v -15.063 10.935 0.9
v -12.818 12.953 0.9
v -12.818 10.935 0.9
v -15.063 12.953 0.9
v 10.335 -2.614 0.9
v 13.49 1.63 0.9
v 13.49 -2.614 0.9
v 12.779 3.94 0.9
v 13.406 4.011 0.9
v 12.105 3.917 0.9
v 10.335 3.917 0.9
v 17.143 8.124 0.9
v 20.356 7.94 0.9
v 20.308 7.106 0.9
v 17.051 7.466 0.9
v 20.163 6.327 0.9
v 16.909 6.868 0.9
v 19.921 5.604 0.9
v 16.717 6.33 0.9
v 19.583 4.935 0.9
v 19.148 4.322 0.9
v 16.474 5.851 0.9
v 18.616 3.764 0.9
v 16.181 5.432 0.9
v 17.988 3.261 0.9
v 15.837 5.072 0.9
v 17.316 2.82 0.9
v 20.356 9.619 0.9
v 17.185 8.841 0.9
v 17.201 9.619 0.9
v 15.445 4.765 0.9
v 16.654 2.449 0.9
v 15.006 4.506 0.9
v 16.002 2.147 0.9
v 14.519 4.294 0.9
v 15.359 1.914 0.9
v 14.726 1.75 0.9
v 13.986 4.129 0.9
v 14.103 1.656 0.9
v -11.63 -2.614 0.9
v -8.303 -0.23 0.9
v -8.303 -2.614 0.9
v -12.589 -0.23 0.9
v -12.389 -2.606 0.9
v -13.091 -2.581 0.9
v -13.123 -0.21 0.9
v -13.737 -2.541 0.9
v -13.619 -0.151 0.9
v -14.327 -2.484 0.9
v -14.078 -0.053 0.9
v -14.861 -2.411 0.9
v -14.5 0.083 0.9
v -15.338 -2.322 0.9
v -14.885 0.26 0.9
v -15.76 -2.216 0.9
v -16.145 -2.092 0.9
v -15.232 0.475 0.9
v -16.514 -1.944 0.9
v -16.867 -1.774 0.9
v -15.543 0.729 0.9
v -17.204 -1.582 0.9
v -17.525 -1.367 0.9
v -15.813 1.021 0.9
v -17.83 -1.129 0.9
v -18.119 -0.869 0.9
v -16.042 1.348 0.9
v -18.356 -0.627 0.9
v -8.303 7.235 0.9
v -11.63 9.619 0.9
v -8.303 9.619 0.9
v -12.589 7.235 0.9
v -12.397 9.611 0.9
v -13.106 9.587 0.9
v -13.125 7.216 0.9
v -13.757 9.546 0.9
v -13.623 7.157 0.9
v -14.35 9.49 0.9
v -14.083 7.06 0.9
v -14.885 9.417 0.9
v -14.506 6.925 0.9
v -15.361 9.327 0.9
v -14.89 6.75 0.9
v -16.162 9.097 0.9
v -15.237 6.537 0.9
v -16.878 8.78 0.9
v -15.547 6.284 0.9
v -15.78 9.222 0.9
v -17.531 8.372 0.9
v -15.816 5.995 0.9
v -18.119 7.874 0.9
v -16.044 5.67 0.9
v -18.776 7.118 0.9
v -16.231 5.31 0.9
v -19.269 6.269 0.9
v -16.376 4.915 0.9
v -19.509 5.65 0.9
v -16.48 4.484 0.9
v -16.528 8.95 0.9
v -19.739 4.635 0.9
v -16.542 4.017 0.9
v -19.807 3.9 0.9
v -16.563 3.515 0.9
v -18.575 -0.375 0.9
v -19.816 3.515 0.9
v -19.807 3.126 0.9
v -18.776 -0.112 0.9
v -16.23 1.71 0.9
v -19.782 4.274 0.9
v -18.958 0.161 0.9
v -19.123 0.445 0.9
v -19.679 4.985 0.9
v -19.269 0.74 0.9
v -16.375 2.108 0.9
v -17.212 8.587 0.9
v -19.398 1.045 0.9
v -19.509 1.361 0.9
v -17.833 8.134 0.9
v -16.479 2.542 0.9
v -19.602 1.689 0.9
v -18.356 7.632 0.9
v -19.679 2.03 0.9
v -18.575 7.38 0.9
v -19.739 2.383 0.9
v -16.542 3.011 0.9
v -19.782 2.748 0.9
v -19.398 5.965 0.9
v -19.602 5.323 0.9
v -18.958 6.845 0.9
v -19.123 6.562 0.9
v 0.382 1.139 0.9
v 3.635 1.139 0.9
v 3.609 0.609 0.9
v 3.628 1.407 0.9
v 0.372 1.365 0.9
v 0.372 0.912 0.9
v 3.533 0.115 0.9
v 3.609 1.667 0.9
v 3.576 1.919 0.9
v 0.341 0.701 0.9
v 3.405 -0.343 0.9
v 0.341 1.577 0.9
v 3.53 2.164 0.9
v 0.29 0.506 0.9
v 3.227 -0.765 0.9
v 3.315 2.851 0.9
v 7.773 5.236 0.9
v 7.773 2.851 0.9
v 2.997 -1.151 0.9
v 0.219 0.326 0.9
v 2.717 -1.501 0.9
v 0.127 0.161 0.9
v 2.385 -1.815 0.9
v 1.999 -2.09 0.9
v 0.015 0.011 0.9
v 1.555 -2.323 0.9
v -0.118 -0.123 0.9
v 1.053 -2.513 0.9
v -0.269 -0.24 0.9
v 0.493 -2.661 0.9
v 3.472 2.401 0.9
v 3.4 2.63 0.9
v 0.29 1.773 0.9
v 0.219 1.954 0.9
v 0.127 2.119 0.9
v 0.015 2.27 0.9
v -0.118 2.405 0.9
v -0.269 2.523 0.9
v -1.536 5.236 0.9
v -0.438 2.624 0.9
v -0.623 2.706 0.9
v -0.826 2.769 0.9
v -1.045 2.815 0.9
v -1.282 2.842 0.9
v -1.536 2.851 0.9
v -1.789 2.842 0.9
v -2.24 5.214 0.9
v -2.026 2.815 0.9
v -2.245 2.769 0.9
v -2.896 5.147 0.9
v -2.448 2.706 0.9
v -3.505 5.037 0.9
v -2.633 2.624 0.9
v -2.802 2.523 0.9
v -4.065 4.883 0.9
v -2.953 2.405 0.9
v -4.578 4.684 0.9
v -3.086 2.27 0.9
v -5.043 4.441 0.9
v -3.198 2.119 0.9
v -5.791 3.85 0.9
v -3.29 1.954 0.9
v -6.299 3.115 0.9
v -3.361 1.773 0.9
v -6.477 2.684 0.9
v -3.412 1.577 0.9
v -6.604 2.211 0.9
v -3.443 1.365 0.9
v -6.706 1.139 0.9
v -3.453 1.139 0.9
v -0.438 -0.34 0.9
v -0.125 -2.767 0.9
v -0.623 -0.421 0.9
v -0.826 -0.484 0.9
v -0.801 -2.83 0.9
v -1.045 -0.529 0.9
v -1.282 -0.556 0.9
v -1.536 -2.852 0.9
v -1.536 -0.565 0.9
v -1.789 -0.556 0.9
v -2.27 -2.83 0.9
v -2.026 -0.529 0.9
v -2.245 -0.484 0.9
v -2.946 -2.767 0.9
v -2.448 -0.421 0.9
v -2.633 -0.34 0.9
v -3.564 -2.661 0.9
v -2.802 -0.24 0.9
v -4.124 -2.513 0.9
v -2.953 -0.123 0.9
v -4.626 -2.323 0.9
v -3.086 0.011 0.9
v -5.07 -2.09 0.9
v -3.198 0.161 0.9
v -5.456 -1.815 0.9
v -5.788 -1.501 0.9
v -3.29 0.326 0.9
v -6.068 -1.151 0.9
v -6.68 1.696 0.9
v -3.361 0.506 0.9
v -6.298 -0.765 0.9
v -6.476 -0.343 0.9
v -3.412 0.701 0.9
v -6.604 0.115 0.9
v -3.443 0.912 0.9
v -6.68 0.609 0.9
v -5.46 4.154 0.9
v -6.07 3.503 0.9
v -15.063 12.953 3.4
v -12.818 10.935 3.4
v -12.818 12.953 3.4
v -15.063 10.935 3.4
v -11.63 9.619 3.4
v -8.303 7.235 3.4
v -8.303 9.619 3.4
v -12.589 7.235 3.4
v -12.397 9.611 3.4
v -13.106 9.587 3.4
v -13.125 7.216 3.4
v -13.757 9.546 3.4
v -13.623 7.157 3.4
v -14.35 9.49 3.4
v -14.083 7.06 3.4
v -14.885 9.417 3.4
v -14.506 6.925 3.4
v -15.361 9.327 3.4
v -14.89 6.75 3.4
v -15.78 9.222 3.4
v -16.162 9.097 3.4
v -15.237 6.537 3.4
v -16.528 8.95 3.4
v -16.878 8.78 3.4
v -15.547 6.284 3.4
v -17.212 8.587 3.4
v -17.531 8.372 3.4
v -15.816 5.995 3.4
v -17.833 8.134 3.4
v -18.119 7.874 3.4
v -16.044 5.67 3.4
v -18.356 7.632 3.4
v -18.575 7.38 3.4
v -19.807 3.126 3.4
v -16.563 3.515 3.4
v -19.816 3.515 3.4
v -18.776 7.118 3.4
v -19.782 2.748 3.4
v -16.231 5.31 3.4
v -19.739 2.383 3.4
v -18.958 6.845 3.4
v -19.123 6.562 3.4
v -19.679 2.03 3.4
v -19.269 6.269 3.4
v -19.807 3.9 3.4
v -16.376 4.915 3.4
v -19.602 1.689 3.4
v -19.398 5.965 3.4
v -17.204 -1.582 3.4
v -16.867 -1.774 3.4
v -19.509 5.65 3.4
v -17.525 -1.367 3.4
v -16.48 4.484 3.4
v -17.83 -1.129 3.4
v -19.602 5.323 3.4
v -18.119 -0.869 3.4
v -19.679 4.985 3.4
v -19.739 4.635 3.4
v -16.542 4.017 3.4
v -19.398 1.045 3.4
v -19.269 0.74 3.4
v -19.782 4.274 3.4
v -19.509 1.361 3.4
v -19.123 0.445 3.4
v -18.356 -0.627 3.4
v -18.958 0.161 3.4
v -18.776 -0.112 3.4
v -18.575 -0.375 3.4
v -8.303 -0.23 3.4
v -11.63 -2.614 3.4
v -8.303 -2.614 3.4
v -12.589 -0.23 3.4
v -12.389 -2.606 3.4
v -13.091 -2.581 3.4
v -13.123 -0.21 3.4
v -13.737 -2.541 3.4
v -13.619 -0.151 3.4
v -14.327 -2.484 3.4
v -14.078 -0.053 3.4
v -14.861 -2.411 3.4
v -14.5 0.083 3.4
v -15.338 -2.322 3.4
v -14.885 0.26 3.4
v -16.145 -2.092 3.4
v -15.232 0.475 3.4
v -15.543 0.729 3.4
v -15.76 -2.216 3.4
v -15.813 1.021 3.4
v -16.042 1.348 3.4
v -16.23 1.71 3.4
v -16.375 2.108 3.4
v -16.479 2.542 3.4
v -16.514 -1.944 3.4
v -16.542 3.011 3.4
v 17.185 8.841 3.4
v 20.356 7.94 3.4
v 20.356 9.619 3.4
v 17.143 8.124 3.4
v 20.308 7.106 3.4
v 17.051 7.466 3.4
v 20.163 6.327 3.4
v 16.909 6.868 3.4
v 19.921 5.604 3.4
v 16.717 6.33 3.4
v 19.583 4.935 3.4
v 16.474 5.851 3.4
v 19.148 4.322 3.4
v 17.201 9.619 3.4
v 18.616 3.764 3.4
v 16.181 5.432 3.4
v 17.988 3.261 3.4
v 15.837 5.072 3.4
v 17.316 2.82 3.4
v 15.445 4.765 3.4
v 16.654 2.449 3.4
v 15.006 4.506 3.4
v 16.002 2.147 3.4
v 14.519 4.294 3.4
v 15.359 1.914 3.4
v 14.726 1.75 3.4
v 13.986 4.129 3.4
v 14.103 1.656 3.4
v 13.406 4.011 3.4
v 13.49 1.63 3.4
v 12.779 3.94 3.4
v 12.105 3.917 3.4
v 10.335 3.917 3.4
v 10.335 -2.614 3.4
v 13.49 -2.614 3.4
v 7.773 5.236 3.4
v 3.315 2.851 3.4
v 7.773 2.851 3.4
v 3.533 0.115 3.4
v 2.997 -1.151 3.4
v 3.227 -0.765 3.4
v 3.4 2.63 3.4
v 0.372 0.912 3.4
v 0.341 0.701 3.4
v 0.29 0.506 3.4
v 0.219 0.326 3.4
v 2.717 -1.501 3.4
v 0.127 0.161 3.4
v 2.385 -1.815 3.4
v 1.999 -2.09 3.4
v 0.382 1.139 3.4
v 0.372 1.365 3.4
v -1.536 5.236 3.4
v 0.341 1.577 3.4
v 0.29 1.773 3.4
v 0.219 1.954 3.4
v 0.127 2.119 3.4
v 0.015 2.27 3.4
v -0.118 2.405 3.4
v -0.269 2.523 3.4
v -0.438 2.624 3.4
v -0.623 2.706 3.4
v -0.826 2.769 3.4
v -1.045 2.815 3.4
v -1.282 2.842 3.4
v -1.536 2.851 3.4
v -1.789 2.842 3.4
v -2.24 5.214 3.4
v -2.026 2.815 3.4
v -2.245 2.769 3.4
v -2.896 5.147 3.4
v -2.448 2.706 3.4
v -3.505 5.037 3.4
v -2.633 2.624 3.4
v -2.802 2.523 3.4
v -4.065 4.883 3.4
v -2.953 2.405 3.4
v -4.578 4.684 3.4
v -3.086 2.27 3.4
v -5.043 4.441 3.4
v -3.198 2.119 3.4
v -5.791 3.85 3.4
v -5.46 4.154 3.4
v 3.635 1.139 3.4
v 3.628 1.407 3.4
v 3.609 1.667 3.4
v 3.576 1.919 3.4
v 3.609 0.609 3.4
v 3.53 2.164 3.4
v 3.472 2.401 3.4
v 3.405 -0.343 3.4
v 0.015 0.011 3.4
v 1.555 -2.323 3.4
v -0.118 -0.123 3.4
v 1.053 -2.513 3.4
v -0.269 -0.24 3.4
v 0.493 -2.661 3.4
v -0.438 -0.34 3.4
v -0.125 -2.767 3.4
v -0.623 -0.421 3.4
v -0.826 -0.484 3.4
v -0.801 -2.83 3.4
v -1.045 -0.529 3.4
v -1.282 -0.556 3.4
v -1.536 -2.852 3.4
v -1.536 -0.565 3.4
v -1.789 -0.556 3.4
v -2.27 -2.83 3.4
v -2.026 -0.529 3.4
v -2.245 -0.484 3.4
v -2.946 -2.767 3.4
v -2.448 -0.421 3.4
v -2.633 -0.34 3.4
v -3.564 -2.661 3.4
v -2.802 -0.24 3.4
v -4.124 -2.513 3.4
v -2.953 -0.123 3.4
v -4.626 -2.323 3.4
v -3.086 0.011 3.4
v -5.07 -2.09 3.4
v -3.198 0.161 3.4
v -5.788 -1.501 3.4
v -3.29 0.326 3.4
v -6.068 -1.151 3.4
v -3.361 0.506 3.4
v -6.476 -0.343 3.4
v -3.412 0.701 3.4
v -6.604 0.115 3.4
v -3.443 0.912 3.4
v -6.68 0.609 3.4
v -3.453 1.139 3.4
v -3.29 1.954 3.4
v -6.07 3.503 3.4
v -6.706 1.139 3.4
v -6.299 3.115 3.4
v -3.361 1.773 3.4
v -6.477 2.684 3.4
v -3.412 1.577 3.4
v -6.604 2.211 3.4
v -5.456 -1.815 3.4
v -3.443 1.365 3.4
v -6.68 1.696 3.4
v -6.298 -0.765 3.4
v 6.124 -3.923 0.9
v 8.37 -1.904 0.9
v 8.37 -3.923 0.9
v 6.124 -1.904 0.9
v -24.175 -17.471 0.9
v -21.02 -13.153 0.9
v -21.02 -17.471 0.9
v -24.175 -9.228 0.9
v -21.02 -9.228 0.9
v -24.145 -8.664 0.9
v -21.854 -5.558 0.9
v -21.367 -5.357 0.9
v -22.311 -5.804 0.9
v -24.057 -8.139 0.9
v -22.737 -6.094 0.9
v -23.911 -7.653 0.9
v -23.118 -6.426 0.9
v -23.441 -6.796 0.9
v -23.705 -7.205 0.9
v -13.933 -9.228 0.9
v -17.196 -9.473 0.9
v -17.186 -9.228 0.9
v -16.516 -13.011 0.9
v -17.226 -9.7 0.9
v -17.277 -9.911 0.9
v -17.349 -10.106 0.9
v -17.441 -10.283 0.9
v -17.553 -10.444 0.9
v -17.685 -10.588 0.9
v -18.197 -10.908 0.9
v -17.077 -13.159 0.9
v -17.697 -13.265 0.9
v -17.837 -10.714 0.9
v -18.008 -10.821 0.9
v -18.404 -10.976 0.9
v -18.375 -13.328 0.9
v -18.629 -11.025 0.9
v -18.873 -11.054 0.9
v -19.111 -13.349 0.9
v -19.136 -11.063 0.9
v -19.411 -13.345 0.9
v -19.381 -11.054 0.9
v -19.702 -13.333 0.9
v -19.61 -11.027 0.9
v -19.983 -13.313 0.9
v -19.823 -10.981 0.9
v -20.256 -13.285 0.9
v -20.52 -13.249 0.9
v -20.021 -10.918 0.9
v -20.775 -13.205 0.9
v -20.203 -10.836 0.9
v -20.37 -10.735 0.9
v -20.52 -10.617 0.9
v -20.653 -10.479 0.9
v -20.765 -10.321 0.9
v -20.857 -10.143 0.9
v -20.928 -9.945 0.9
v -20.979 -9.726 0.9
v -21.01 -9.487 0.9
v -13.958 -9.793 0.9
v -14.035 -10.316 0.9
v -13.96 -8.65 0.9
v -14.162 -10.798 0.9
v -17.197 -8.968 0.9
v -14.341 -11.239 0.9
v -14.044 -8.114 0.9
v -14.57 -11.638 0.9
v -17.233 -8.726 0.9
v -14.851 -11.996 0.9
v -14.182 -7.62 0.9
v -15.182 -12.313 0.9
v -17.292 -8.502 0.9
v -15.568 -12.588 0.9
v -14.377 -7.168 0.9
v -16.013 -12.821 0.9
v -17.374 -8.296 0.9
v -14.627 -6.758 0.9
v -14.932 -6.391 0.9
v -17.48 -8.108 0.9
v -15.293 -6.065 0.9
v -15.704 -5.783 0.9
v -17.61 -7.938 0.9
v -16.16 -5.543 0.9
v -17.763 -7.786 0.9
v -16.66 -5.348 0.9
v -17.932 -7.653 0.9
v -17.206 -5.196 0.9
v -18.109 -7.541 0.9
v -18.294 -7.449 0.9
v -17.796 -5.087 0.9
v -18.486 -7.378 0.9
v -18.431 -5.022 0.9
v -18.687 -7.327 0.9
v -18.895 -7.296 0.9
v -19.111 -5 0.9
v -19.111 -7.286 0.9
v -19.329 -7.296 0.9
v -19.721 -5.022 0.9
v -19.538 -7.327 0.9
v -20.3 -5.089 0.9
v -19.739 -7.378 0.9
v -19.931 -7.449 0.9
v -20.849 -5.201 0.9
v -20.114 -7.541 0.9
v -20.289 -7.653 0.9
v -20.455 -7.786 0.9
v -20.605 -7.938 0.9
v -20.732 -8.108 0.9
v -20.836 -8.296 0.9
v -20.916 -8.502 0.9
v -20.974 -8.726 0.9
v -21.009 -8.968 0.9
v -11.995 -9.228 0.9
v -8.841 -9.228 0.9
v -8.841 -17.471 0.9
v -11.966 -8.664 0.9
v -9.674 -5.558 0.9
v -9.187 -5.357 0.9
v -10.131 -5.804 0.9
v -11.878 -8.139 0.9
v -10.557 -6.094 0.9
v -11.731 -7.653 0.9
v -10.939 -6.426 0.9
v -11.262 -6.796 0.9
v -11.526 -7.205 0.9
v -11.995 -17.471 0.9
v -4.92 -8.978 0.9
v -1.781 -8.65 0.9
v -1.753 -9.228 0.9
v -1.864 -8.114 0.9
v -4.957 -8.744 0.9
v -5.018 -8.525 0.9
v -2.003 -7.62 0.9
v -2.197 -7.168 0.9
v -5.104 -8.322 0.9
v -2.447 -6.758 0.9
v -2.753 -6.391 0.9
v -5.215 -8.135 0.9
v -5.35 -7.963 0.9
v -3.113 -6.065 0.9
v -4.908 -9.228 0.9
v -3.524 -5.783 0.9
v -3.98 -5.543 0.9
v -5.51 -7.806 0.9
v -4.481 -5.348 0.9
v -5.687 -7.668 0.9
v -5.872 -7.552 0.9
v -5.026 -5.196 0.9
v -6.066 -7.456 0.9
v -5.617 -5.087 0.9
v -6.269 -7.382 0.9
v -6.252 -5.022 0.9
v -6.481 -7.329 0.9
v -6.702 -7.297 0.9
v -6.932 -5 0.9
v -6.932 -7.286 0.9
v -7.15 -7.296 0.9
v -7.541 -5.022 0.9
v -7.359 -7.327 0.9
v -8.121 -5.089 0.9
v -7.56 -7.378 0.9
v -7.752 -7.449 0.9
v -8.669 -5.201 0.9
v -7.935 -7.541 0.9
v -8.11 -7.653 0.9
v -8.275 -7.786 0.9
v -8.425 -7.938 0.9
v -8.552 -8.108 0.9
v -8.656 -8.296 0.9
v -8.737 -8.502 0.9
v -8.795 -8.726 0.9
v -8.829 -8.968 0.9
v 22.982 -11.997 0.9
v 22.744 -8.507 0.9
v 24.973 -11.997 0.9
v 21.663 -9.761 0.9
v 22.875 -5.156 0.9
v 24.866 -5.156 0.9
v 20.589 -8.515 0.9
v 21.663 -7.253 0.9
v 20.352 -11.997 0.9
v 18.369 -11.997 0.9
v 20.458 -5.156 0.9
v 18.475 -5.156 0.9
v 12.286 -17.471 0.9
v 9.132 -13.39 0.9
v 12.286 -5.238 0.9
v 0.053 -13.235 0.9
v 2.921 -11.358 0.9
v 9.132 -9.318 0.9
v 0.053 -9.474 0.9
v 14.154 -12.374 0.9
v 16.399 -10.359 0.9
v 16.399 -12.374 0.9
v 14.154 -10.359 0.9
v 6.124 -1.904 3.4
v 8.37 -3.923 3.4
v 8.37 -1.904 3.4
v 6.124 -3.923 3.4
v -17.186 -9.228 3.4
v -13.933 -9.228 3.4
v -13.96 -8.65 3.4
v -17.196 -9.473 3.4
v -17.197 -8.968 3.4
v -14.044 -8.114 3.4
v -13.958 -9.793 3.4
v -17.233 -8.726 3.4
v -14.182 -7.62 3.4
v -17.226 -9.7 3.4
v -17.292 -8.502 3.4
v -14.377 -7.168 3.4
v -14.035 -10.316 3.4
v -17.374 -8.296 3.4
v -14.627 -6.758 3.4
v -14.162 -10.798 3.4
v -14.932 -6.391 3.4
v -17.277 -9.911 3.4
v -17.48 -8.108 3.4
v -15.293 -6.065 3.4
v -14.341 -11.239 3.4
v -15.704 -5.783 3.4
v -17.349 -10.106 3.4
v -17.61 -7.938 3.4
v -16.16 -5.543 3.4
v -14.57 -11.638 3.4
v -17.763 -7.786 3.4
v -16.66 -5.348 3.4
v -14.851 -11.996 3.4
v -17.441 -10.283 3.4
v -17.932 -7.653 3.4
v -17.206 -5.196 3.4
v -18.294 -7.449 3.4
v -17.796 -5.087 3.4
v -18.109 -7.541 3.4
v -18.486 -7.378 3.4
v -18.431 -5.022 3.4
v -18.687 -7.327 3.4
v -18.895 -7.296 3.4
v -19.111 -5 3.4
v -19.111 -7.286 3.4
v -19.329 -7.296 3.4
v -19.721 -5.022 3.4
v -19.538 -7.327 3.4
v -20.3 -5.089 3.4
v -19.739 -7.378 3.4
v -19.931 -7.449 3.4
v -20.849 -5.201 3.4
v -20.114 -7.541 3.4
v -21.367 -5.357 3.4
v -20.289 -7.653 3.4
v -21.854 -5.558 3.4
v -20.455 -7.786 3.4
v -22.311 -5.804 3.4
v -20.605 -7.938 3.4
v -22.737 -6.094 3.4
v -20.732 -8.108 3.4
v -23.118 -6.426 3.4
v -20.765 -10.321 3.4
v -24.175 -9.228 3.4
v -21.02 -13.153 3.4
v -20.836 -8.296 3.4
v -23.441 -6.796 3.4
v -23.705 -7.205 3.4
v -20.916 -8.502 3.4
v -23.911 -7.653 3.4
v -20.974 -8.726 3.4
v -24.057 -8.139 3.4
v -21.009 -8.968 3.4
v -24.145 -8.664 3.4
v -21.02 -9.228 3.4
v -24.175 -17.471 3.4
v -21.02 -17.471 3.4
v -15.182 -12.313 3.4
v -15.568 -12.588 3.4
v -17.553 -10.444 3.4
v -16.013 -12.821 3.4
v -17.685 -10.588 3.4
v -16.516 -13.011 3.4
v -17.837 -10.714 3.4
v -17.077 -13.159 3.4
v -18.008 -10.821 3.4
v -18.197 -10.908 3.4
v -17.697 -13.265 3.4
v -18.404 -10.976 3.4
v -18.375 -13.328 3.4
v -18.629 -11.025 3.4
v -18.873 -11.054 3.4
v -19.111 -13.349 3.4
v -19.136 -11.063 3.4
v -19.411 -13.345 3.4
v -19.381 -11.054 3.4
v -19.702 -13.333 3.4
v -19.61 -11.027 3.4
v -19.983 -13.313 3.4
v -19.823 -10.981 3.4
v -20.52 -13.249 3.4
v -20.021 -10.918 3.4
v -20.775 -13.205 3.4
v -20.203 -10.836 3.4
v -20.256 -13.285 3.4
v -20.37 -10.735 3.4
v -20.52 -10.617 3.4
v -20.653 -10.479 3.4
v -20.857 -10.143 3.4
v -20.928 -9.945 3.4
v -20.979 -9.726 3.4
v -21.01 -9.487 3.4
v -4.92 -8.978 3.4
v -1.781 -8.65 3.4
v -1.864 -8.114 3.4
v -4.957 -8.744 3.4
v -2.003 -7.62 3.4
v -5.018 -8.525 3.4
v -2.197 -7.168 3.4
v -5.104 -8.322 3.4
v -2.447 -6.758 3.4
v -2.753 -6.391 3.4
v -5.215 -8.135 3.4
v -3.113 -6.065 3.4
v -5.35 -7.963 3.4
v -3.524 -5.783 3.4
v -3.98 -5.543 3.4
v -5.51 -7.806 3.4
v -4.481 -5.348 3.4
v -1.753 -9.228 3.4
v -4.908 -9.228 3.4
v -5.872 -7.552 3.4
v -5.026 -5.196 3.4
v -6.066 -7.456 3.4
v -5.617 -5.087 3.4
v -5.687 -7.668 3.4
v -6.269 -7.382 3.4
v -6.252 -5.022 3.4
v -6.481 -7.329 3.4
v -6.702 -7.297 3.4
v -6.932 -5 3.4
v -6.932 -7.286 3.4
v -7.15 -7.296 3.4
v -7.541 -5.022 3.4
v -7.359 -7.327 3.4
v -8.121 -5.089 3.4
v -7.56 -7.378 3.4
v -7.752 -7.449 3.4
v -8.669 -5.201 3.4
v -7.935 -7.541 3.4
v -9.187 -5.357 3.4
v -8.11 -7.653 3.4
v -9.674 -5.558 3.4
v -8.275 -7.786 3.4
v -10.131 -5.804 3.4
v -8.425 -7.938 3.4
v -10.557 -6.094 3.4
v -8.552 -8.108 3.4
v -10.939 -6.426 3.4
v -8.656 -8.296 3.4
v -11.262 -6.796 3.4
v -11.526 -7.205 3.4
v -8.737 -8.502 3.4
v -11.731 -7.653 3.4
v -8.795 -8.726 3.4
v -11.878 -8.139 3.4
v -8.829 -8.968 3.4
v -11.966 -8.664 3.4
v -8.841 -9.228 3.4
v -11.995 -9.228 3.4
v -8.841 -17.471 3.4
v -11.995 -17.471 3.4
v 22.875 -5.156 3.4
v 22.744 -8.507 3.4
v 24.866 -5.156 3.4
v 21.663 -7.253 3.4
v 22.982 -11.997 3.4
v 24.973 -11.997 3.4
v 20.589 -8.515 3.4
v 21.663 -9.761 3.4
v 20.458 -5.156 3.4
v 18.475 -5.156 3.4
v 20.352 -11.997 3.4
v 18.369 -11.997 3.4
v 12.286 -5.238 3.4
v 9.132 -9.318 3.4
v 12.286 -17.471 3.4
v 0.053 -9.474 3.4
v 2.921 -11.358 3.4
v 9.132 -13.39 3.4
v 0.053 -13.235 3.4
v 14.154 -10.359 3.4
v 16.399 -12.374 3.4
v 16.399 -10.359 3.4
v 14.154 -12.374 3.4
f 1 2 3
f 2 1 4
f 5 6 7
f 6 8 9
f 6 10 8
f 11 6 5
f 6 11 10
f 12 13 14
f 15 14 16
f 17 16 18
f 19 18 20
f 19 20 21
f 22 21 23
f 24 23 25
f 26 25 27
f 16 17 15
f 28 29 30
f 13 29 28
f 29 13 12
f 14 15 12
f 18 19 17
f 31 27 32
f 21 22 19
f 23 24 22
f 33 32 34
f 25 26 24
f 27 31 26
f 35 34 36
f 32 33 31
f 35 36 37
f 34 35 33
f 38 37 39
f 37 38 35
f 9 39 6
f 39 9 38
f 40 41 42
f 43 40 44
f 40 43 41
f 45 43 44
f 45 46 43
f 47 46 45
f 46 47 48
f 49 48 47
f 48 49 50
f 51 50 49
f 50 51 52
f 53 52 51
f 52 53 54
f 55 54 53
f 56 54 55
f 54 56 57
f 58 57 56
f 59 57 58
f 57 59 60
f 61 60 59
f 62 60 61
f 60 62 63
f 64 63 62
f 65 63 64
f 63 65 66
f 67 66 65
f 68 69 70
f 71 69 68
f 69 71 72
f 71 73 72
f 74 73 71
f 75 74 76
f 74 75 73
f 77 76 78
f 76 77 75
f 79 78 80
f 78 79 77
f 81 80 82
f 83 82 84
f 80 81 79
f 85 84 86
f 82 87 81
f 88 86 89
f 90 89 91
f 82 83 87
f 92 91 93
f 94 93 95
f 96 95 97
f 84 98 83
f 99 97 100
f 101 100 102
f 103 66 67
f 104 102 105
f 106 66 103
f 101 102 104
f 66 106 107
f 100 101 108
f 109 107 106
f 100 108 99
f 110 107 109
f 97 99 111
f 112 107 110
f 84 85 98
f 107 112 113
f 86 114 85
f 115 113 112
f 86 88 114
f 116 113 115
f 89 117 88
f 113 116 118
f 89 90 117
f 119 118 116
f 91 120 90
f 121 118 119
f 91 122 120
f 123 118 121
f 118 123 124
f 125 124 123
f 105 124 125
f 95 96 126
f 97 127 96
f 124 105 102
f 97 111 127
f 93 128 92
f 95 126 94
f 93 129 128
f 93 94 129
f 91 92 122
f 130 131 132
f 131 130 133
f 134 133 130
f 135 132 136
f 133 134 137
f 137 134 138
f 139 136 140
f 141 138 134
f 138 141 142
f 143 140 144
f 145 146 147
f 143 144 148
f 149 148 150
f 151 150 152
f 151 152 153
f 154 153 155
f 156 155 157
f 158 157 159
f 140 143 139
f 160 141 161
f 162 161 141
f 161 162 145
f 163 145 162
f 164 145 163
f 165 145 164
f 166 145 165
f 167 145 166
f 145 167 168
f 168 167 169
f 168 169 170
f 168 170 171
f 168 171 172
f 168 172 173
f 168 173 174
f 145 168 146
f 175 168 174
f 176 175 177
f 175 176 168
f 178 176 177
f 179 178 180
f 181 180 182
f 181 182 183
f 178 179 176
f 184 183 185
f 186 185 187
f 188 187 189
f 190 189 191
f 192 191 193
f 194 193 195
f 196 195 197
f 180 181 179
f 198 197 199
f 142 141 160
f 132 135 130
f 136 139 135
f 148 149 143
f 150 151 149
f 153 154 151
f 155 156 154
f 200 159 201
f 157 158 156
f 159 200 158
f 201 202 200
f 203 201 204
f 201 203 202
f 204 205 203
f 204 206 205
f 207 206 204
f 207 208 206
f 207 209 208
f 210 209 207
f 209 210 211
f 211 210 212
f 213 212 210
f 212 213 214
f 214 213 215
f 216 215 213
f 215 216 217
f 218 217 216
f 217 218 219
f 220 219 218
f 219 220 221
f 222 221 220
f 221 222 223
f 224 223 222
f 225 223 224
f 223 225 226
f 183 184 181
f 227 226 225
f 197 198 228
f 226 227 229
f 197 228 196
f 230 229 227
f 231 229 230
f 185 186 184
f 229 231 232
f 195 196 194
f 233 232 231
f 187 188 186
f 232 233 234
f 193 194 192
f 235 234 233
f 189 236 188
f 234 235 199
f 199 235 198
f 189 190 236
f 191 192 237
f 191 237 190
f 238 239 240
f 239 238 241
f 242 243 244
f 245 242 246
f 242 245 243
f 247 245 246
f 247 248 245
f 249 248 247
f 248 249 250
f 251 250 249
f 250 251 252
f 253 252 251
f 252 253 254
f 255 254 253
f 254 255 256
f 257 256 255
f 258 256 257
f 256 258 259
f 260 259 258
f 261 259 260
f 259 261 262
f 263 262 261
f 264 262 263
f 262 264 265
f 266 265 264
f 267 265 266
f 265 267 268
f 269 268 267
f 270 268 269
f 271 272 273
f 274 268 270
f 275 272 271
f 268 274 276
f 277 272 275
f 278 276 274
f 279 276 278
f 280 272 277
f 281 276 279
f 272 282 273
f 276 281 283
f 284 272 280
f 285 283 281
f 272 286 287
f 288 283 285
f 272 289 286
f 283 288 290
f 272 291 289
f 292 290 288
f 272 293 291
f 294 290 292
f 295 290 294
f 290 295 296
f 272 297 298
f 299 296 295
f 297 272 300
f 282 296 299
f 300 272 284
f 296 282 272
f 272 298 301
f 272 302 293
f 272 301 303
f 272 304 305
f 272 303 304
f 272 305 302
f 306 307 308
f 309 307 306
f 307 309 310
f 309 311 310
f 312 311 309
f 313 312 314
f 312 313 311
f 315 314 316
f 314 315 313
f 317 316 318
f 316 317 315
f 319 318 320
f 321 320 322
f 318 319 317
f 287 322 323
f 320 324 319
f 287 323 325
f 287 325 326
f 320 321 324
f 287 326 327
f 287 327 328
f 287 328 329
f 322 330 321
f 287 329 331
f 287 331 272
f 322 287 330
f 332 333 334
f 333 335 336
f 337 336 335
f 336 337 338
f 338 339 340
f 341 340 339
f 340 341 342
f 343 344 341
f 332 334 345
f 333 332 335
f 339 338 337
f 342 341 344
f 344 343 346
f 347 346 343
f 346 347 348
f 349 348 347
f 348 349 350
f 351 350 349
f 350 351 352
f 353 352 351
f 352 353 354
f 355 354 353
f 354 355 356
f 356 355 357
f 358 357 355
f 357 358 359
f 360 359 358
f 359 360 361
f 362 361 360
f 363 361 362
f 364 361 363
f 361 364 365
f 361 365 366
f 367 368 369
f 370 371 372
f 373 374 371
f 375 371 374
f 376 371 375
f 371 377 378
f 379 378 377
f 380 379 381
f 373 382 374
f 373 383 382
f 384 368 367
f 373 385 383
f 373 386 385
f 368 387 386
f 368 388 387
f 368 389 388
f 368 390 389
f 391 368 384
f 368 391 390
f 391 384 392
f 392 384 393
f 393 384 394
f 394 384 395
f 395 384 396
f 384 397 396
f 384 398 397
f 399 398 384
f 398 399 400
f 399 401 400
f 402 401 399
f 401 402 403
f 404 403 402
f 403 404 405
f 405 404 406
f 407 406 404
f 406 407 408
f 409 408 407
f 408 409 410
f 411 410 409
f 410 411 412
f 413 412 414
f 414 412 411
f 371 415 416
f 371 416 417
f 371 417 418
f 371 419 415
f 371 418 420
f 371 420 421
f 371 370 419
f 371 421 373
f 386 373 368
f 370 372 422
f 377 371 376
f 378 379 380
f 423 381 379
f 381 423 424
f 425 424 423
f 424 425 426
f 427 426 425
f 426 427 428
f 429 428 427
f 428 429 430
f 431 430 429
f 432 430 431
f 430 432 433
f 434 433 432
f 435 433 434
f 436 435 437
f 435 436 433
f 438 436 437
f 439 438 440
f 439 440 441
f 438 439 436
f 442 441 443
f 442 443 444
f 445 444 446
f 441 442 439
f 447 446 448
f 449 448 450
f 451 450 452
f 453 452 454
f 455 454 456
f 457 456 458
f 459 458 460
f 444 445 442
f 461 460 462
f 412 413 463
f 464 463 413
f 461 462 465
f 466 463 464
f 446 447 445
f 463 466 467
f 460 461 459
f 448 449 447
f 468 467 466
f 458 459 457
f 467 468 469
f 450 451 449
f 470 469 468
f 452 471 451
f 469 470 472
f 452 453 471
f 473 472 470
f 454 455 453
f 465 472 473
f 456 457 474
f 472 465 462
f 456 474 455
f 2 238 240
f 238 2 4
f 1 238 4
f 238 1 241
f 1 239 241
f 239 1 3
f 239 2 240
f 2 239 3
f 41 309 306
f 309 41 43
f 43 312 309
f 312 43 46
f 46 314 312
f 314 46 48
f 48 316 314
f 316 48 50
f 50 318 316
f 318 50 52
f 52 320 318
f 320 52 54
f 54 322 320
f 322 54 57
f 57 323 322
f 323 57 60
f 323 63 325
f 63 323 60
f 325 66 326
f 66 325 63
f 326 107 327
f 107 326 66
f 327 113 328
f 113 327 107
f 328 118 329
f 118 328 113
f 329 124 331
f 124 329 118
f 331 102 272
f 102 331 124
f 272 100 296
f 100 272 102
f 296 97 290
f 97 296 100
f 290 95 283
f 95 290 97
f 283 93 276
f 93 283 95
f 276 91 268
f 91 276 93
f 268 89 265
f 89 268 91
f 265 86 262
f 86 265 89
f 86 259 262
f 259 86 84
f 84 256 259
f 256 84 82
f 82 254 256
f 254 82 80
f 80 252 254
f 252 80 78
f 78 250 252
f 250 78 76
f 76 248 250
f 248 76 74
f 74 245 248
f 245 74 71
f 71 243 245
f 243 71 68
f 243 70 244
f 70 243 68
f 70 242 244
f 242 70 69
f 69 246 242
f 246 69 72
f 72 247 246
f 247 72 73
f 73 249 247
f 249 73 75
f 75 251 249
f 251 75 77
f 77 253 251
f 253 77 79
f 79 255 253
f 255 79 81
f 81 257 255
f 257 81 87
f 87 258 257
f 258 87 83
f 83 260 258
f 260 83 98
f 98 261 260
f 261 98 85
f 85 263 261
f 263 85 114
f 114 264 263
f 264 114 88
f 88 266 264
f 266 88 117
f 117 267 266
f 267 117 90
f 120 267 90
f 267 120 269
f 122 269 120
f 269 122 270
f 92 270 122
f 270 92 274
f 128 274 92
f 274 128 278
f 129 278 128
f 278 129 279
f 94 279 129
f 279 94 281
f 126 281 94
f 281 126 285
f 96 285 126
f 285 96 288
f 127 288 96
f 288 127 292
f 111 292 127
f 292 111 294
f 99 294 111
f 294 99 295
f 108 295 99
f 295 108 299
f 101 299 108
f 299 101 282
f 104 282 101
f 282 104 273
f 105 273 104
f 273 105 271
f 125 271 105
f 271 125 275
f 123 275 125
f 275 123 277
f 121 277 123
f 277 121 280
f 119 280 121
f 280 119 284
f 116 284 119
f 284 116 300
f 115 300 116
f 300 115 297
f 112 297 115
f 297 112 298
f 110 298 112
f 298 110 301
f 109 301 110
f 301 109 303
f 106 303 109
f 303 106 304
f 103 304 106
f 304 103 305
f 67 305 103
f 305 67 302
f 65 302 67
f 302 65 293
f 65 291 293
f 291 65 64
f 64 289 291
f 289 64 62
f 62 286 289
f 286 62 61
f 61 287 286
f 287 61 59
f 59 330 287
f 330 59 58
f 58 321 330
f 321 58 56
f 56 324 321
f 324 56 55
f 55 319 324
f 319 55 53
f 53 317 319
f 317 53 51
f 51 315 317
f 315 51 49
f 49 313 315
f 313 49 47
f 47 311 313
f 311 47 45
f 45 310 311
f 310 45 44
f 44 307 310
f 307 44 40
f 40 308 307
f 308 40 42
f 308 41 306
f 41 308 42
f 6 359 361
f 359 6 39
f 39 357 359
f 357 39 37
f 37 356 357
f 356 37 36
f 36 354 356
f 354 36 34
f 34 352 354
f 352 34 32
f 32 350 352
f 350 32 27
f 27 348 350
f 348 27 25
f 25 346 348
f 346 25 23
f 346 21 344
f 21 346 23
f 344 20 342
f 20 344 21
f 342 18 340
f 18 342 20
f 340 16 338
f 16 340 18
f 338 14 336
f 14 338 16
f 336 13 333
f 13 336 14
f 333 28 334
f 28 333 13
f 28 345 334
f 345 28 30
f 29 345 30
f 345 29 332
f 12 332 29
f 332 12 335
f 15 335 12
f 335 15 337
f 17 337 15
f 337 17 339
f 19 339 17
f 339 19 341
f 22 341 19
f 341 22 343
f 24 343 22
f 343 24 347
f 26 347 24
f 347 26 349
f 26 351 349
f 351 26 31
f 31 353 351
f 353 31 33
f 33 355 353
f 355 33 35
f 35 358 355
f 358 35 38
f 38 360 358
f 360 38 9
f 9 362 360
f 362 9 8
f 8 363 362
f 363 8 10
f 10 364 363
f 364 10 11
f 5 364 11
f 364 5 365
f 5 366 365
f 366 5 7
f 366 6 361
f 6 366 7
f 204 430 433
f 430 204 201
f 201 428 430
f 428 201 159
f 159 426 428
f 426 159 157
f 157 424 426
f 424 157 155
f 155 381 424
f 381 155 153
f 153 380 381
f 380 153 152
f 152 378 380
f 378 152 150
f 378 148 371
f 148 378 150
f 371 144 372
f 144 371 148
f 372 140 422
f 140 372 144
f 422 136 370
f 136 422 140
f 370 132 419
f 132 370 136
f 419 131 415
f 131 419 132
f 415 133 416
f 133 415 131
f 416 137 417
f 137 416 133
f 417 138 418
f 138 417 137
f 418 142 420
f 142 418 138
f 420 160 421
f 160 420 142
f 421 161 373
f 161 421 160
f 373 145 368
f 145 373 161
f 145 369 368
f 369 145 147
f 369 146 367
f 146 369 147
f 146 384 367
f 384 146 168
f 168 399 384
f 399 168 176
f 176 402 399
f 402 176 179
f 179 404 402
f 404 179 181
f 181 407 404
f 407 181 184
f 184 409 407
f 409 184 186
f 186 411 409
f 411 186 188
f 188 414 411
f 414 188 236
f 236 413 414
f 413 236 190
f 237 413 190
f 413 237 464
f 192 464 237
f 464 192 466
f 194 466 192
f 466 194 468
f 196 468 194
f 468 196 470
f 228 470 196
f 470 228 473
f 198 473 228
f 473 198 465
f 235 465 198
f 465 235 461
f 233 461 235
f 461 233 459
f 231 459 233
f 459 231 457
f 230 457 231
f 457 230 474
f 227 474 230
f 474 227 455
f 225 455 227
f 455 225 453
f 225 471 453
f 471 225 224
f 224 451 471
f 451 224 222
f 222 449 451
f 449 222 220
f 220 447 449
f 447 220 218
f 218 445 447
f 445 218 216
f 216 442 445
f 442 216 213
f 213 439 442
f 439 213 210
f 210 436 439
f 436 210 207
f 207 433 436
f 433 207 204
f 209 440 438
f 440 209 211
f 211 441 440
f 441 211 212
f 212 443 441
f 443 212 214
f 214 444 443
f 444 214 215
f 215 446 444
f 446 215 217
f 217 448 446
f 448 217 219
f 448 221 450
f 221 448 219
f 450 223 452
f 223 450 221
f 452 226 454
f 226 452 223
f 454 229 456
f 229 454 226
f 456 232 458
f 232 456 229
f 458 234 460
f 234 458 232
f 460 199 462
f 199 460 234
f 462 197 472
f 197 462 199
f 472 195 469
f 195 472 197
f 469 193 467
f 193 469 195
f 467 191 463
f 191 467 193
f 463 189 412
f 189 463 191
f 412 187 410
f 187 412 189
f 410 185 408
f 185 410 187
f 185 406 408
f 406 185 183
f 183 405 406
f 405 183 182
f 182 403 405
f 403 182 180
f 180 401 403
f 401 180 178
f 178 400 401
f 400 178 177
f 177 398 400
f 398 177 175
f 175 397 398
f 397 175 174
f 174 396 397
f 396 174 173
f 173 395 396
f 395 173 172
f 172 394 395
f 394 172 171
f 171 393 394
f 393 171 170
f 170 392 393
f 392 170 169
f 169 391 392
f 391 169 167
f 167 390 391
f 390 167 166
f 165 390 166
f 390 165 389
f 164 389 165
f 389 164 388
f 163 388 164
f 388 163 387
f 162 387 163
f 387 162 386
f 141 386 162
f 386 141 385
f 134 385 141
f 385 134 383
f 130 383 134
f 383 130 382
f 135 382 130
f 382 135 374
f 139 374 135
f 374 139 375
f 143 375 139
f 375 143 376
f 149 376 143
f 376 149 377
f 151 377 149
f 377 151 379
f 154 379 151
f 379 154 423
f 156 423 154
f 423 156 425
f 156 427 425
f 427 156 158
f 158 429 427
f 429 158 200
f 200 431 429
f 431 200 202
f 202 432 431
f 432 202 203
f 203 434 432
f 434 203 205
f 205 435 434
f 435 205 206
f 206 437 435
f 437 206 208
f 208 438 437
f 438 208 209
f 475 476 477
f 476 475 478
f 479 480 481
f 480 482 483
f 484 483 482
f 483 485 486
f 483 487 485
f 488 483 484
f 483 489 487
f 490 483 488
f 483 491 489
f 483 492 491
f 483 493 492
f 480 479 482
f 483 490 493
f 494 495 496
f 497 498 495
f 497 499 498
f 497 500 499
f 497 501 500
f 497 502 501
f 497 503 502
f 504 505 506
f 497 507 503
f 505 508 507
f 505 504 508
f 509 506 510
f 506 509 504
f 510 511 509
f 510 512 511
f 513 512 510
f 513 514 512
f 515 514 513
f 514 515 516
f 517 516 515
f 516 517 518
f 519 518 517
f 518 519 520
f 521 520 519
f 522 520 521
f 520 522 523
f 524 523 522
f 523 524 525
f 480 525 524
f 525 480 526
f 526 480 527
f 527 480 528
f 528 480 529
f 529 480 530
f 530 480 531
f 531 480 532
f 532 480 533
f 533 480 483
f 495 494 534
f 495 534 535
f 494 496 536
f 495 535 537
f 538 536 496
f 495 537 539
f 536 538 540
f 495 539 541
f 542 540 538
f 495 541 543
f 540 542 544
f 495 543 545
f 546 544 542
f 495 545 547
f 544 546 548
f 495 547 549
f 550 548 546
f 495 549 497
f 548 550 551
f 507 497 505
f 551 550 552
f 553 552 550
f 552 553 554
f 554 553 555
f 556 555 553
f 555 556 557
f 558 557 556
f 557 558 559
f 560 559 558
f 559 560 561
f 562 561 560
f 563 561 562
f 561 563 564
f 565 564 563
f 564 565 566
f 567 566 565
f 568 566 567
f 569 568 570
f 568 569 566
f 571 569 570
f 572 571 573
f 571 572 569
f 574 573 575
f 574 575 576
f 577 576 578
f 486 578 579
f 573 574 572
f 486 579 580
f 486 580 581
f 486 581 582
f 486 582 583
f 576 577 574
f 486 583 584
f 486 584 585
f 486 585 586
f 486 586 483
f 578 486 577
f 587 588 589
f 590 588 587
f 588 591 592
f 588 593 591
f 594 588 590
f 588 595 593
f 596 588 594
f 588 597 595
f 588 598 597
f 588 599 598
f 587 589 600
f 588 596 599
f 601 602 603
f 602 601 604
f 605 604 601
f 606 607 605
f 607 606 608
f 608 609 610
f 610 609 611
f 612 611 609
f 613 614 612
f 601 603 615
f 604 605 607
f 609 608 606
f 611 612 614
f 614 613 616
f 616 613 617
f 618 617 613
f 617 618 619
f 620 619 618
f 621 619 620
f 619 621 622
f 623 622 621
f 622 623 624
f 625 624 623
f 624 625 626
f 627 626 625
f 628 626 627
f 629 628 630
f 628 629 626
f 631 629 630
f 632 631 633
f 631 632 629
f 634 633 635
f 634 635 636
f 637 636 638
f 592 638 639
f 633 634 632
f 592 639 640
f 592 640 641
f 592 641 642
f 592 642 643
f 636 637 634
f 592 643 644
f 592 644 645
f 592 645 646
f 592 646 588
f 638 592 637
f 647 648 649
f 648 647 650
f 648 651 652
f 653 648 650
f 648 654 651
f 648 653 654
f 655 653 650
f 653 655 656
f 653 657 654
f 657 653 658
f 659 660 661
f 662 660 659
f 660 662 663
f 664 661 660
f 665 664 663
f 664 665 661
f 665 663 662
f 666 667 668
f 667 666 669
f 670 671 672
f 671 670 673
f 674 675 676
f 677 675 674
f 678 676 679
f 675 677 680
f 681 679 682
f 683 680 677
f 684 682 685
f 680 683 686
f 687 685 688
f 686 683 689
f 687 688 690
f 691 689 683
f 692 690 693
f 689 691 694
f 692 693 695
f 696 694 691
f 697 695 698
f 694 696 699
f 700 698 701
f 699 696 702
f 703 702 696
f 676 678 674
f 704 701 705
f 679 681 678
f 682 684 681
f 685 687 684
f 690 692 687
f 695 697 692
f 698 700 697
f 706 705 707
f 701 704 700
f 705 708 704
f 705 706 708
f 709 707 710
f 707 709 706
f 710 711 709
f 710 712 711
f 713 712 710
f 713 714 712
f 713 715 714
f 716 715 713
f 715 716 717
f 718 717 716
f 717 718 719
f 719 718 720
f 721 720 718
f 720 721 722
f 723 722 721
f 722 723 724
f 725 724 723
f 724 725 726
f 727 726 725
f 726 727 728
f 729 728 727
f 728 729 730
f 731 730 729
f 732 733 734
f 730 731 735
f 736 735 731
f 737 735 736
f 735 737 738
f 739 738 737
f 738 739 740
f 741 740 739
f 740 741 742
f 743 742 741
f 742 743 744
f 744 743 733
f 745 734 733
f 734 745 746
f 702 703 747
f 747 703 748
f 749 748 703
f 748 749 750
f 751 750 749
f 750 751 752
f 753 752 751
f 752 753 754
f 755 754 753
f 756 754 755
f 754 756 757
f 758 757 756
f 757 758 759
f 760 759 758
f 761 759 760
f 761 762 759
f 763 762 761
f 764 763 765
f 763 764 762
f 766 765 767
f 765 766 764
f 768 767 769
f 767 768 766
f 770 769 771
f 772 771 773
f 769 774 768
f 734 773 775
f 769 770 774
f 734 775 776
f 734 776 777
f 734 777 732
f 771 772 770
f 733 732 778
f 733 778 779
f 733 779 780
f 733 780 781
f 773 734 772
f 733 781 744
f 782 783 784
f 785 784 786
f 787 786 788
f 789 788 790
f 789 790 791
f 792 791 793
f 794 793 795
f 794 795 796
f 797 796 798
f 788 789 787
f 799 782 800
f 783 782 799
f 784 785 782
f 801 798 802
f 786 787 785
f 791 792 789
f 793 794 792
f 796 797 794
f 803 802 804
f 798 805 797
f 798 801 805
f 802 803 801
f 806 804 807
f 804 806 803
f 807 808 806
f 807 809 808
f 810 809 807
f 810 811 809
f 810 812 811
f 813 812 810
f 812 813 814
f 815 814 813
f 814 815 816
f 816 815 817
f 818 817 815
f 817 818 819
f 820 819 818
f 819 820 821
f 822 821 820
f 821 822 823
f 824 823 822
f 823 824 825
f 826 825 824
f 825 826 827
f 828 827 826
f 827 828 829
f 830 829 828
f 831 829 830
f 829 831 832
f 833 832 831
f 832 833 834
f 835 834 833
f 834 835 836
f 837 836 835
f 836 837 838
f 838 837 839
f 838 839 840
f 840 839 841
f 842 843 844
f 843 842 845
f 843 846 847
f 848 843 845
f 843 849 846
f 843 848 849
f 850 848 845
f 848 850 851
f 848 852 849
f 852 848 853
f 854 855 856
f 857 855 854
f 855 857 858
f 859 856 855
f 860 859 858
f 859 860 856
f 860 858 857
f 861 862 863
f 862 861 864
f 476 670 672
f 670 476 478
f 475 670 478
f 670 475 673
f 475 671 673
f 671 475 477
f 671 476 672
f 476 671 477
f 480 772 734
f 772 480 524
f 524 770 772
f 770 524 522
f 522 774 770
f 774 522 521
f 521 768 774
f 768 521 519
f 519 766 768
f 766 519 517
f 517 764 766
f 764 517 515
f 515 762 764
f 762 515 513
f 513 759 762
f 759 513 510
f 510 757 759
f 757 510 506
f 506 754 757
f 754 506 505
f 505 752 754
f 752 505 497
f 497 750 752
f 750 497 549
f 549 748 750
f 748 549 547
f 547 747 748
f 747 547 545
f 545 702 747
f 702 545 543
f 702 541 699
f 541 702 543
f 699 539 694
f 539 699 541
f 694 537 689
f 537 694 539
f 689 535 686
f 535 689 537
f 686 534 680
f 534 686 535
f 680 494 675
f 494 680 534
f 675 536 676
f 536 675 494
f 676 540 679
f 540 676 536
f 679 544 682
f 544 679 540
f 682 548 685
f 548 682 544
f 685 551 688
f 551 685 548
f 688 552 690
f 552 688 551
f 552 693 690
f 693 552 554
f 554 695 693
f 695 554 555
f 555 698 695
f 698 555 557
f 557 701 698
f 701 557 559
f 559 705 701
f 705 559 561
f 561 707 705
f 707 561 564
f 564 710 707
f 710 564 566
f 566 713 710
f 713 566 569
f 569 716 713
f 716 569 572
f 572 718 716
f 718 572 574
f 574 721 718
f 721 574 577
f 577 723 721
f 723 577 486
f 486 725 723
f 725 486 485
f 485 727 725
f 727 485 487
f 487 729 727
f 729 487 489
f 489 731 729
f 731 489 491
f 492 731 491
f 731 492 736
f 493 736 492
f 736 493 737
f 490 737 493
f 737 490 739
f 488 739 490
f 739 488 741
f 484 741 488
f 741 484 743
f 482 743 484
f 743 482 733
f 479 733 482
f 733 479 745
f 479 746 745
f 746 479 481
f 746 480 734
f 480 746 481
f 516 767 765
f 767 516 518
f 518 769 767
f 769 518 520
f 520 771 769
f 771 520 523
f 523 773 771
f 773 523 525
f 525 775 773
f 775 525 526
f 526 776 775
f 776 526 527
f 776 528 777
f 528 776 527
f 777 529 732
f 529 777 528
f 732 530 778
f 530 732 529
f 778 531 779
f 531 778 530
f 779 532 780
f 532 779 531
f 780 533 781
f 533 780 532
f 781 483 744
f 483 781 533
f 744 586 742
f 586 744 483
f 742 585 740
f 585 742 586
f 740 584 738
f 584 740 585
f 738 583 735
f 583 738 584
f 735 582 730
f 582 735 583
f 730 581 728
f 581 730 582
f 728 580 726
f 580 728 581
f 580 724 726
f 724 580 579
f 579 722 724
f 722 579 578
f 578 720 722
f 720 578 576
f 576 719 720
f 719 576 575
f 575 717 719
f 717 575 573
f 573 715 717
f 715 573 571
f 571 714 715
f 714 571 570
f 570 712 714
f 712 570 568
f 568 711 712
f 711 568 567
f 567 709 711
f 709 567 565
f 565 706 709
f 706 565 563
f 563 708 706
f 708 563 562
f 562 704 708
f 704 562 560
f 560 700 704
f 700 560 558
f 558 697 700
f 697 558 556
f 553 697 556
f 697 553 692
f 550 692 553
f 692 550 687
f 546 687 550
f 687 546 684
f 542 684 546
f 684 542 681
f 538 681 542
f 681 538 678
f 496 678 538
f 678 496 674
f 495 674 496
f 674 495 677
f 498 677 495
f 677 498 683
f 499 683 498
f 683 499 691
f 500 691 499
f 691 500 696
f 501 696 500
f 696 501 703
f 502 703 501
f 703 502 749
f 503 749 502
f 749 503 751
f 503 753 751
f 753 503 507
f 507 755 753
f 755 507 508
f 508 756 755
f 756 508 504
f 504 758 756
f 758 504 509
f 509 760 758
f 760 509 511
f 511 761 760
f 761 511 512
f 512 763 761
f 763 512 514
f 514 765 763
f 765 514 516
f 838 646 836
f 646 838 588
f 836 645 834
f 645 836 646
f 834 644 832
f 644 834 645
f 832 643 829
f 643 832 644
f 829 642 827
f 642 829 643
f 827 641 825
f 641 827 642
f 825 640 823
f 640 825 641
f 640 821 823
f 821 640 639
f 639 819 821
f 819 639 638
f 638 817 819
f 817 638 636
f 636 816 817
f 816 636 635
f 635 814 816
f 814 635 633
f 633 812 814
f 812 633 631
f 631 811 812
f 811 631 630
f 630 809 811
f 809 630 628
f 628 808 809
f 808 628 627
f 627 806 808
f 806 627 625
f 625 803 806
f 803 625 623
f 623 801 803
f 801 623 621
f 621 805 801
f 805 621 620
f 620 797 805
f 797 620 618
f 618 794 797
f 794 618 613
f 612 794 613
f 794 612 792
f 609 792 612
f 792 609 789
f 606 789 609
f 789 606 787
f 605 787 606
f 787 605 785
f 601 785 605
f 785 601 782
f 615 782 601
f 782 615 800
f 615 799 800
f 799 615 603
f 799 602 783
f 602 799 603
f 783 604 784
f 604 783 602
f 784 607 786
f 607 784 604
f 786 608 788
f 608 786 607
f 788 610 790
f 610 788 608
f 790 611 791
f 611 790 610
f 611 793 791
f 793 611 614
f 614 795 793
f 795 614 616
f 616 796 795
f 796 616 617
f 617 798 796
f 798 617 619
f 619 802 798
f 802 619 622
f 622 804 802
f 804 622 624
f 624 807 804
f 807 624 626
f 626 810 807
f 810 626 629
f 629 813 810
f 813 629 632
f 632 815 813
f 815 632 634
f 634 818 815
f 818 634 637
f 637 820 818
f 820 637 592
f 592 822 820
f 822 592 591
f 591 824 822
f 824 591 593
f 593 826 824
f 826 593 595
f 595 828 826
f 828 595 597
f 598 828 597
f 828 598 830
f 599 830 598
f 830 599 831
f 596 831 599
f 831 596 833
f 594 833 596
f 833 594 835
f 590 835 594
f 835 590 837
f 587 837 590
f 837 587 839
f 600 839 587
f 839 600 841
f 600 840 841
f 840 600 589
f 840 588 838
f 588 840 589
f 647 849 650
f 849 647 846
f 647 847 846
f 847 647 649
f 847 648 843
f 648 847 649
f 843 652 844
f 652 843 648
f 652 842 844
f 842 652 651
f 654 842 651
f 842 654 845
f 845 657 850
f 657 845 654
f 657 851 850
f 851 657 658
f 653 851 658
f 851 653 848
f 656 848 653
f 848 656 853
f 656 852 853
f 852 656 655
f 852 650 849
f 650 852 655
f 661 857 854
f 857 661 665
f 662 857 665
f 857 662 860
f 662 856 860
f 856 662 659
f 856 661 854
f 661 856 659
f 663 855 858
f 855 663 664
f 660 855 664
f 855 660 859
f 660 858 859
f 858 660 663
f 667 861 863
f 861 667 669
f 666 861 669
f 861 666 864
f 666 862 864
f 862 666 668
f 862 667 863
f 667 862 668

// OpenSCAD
$fn = 48;
  // syllabics (overlaid on icon, tallest)
  translate([0, 4.870, 0.900]) linear_extrude(height=2.500) text("ᑖᓂᓯ", size=12.083, halign="center", valign="center", font="Euphemia UCAS:style=Bold");
  translate([0, -9.870, 0.900]) linear_extrude(height=2.500) text("ᑭᒋᐚᕽ", size=12.083, halign="center", valign="center", font="Euphemia UCAS:style=Bold");
